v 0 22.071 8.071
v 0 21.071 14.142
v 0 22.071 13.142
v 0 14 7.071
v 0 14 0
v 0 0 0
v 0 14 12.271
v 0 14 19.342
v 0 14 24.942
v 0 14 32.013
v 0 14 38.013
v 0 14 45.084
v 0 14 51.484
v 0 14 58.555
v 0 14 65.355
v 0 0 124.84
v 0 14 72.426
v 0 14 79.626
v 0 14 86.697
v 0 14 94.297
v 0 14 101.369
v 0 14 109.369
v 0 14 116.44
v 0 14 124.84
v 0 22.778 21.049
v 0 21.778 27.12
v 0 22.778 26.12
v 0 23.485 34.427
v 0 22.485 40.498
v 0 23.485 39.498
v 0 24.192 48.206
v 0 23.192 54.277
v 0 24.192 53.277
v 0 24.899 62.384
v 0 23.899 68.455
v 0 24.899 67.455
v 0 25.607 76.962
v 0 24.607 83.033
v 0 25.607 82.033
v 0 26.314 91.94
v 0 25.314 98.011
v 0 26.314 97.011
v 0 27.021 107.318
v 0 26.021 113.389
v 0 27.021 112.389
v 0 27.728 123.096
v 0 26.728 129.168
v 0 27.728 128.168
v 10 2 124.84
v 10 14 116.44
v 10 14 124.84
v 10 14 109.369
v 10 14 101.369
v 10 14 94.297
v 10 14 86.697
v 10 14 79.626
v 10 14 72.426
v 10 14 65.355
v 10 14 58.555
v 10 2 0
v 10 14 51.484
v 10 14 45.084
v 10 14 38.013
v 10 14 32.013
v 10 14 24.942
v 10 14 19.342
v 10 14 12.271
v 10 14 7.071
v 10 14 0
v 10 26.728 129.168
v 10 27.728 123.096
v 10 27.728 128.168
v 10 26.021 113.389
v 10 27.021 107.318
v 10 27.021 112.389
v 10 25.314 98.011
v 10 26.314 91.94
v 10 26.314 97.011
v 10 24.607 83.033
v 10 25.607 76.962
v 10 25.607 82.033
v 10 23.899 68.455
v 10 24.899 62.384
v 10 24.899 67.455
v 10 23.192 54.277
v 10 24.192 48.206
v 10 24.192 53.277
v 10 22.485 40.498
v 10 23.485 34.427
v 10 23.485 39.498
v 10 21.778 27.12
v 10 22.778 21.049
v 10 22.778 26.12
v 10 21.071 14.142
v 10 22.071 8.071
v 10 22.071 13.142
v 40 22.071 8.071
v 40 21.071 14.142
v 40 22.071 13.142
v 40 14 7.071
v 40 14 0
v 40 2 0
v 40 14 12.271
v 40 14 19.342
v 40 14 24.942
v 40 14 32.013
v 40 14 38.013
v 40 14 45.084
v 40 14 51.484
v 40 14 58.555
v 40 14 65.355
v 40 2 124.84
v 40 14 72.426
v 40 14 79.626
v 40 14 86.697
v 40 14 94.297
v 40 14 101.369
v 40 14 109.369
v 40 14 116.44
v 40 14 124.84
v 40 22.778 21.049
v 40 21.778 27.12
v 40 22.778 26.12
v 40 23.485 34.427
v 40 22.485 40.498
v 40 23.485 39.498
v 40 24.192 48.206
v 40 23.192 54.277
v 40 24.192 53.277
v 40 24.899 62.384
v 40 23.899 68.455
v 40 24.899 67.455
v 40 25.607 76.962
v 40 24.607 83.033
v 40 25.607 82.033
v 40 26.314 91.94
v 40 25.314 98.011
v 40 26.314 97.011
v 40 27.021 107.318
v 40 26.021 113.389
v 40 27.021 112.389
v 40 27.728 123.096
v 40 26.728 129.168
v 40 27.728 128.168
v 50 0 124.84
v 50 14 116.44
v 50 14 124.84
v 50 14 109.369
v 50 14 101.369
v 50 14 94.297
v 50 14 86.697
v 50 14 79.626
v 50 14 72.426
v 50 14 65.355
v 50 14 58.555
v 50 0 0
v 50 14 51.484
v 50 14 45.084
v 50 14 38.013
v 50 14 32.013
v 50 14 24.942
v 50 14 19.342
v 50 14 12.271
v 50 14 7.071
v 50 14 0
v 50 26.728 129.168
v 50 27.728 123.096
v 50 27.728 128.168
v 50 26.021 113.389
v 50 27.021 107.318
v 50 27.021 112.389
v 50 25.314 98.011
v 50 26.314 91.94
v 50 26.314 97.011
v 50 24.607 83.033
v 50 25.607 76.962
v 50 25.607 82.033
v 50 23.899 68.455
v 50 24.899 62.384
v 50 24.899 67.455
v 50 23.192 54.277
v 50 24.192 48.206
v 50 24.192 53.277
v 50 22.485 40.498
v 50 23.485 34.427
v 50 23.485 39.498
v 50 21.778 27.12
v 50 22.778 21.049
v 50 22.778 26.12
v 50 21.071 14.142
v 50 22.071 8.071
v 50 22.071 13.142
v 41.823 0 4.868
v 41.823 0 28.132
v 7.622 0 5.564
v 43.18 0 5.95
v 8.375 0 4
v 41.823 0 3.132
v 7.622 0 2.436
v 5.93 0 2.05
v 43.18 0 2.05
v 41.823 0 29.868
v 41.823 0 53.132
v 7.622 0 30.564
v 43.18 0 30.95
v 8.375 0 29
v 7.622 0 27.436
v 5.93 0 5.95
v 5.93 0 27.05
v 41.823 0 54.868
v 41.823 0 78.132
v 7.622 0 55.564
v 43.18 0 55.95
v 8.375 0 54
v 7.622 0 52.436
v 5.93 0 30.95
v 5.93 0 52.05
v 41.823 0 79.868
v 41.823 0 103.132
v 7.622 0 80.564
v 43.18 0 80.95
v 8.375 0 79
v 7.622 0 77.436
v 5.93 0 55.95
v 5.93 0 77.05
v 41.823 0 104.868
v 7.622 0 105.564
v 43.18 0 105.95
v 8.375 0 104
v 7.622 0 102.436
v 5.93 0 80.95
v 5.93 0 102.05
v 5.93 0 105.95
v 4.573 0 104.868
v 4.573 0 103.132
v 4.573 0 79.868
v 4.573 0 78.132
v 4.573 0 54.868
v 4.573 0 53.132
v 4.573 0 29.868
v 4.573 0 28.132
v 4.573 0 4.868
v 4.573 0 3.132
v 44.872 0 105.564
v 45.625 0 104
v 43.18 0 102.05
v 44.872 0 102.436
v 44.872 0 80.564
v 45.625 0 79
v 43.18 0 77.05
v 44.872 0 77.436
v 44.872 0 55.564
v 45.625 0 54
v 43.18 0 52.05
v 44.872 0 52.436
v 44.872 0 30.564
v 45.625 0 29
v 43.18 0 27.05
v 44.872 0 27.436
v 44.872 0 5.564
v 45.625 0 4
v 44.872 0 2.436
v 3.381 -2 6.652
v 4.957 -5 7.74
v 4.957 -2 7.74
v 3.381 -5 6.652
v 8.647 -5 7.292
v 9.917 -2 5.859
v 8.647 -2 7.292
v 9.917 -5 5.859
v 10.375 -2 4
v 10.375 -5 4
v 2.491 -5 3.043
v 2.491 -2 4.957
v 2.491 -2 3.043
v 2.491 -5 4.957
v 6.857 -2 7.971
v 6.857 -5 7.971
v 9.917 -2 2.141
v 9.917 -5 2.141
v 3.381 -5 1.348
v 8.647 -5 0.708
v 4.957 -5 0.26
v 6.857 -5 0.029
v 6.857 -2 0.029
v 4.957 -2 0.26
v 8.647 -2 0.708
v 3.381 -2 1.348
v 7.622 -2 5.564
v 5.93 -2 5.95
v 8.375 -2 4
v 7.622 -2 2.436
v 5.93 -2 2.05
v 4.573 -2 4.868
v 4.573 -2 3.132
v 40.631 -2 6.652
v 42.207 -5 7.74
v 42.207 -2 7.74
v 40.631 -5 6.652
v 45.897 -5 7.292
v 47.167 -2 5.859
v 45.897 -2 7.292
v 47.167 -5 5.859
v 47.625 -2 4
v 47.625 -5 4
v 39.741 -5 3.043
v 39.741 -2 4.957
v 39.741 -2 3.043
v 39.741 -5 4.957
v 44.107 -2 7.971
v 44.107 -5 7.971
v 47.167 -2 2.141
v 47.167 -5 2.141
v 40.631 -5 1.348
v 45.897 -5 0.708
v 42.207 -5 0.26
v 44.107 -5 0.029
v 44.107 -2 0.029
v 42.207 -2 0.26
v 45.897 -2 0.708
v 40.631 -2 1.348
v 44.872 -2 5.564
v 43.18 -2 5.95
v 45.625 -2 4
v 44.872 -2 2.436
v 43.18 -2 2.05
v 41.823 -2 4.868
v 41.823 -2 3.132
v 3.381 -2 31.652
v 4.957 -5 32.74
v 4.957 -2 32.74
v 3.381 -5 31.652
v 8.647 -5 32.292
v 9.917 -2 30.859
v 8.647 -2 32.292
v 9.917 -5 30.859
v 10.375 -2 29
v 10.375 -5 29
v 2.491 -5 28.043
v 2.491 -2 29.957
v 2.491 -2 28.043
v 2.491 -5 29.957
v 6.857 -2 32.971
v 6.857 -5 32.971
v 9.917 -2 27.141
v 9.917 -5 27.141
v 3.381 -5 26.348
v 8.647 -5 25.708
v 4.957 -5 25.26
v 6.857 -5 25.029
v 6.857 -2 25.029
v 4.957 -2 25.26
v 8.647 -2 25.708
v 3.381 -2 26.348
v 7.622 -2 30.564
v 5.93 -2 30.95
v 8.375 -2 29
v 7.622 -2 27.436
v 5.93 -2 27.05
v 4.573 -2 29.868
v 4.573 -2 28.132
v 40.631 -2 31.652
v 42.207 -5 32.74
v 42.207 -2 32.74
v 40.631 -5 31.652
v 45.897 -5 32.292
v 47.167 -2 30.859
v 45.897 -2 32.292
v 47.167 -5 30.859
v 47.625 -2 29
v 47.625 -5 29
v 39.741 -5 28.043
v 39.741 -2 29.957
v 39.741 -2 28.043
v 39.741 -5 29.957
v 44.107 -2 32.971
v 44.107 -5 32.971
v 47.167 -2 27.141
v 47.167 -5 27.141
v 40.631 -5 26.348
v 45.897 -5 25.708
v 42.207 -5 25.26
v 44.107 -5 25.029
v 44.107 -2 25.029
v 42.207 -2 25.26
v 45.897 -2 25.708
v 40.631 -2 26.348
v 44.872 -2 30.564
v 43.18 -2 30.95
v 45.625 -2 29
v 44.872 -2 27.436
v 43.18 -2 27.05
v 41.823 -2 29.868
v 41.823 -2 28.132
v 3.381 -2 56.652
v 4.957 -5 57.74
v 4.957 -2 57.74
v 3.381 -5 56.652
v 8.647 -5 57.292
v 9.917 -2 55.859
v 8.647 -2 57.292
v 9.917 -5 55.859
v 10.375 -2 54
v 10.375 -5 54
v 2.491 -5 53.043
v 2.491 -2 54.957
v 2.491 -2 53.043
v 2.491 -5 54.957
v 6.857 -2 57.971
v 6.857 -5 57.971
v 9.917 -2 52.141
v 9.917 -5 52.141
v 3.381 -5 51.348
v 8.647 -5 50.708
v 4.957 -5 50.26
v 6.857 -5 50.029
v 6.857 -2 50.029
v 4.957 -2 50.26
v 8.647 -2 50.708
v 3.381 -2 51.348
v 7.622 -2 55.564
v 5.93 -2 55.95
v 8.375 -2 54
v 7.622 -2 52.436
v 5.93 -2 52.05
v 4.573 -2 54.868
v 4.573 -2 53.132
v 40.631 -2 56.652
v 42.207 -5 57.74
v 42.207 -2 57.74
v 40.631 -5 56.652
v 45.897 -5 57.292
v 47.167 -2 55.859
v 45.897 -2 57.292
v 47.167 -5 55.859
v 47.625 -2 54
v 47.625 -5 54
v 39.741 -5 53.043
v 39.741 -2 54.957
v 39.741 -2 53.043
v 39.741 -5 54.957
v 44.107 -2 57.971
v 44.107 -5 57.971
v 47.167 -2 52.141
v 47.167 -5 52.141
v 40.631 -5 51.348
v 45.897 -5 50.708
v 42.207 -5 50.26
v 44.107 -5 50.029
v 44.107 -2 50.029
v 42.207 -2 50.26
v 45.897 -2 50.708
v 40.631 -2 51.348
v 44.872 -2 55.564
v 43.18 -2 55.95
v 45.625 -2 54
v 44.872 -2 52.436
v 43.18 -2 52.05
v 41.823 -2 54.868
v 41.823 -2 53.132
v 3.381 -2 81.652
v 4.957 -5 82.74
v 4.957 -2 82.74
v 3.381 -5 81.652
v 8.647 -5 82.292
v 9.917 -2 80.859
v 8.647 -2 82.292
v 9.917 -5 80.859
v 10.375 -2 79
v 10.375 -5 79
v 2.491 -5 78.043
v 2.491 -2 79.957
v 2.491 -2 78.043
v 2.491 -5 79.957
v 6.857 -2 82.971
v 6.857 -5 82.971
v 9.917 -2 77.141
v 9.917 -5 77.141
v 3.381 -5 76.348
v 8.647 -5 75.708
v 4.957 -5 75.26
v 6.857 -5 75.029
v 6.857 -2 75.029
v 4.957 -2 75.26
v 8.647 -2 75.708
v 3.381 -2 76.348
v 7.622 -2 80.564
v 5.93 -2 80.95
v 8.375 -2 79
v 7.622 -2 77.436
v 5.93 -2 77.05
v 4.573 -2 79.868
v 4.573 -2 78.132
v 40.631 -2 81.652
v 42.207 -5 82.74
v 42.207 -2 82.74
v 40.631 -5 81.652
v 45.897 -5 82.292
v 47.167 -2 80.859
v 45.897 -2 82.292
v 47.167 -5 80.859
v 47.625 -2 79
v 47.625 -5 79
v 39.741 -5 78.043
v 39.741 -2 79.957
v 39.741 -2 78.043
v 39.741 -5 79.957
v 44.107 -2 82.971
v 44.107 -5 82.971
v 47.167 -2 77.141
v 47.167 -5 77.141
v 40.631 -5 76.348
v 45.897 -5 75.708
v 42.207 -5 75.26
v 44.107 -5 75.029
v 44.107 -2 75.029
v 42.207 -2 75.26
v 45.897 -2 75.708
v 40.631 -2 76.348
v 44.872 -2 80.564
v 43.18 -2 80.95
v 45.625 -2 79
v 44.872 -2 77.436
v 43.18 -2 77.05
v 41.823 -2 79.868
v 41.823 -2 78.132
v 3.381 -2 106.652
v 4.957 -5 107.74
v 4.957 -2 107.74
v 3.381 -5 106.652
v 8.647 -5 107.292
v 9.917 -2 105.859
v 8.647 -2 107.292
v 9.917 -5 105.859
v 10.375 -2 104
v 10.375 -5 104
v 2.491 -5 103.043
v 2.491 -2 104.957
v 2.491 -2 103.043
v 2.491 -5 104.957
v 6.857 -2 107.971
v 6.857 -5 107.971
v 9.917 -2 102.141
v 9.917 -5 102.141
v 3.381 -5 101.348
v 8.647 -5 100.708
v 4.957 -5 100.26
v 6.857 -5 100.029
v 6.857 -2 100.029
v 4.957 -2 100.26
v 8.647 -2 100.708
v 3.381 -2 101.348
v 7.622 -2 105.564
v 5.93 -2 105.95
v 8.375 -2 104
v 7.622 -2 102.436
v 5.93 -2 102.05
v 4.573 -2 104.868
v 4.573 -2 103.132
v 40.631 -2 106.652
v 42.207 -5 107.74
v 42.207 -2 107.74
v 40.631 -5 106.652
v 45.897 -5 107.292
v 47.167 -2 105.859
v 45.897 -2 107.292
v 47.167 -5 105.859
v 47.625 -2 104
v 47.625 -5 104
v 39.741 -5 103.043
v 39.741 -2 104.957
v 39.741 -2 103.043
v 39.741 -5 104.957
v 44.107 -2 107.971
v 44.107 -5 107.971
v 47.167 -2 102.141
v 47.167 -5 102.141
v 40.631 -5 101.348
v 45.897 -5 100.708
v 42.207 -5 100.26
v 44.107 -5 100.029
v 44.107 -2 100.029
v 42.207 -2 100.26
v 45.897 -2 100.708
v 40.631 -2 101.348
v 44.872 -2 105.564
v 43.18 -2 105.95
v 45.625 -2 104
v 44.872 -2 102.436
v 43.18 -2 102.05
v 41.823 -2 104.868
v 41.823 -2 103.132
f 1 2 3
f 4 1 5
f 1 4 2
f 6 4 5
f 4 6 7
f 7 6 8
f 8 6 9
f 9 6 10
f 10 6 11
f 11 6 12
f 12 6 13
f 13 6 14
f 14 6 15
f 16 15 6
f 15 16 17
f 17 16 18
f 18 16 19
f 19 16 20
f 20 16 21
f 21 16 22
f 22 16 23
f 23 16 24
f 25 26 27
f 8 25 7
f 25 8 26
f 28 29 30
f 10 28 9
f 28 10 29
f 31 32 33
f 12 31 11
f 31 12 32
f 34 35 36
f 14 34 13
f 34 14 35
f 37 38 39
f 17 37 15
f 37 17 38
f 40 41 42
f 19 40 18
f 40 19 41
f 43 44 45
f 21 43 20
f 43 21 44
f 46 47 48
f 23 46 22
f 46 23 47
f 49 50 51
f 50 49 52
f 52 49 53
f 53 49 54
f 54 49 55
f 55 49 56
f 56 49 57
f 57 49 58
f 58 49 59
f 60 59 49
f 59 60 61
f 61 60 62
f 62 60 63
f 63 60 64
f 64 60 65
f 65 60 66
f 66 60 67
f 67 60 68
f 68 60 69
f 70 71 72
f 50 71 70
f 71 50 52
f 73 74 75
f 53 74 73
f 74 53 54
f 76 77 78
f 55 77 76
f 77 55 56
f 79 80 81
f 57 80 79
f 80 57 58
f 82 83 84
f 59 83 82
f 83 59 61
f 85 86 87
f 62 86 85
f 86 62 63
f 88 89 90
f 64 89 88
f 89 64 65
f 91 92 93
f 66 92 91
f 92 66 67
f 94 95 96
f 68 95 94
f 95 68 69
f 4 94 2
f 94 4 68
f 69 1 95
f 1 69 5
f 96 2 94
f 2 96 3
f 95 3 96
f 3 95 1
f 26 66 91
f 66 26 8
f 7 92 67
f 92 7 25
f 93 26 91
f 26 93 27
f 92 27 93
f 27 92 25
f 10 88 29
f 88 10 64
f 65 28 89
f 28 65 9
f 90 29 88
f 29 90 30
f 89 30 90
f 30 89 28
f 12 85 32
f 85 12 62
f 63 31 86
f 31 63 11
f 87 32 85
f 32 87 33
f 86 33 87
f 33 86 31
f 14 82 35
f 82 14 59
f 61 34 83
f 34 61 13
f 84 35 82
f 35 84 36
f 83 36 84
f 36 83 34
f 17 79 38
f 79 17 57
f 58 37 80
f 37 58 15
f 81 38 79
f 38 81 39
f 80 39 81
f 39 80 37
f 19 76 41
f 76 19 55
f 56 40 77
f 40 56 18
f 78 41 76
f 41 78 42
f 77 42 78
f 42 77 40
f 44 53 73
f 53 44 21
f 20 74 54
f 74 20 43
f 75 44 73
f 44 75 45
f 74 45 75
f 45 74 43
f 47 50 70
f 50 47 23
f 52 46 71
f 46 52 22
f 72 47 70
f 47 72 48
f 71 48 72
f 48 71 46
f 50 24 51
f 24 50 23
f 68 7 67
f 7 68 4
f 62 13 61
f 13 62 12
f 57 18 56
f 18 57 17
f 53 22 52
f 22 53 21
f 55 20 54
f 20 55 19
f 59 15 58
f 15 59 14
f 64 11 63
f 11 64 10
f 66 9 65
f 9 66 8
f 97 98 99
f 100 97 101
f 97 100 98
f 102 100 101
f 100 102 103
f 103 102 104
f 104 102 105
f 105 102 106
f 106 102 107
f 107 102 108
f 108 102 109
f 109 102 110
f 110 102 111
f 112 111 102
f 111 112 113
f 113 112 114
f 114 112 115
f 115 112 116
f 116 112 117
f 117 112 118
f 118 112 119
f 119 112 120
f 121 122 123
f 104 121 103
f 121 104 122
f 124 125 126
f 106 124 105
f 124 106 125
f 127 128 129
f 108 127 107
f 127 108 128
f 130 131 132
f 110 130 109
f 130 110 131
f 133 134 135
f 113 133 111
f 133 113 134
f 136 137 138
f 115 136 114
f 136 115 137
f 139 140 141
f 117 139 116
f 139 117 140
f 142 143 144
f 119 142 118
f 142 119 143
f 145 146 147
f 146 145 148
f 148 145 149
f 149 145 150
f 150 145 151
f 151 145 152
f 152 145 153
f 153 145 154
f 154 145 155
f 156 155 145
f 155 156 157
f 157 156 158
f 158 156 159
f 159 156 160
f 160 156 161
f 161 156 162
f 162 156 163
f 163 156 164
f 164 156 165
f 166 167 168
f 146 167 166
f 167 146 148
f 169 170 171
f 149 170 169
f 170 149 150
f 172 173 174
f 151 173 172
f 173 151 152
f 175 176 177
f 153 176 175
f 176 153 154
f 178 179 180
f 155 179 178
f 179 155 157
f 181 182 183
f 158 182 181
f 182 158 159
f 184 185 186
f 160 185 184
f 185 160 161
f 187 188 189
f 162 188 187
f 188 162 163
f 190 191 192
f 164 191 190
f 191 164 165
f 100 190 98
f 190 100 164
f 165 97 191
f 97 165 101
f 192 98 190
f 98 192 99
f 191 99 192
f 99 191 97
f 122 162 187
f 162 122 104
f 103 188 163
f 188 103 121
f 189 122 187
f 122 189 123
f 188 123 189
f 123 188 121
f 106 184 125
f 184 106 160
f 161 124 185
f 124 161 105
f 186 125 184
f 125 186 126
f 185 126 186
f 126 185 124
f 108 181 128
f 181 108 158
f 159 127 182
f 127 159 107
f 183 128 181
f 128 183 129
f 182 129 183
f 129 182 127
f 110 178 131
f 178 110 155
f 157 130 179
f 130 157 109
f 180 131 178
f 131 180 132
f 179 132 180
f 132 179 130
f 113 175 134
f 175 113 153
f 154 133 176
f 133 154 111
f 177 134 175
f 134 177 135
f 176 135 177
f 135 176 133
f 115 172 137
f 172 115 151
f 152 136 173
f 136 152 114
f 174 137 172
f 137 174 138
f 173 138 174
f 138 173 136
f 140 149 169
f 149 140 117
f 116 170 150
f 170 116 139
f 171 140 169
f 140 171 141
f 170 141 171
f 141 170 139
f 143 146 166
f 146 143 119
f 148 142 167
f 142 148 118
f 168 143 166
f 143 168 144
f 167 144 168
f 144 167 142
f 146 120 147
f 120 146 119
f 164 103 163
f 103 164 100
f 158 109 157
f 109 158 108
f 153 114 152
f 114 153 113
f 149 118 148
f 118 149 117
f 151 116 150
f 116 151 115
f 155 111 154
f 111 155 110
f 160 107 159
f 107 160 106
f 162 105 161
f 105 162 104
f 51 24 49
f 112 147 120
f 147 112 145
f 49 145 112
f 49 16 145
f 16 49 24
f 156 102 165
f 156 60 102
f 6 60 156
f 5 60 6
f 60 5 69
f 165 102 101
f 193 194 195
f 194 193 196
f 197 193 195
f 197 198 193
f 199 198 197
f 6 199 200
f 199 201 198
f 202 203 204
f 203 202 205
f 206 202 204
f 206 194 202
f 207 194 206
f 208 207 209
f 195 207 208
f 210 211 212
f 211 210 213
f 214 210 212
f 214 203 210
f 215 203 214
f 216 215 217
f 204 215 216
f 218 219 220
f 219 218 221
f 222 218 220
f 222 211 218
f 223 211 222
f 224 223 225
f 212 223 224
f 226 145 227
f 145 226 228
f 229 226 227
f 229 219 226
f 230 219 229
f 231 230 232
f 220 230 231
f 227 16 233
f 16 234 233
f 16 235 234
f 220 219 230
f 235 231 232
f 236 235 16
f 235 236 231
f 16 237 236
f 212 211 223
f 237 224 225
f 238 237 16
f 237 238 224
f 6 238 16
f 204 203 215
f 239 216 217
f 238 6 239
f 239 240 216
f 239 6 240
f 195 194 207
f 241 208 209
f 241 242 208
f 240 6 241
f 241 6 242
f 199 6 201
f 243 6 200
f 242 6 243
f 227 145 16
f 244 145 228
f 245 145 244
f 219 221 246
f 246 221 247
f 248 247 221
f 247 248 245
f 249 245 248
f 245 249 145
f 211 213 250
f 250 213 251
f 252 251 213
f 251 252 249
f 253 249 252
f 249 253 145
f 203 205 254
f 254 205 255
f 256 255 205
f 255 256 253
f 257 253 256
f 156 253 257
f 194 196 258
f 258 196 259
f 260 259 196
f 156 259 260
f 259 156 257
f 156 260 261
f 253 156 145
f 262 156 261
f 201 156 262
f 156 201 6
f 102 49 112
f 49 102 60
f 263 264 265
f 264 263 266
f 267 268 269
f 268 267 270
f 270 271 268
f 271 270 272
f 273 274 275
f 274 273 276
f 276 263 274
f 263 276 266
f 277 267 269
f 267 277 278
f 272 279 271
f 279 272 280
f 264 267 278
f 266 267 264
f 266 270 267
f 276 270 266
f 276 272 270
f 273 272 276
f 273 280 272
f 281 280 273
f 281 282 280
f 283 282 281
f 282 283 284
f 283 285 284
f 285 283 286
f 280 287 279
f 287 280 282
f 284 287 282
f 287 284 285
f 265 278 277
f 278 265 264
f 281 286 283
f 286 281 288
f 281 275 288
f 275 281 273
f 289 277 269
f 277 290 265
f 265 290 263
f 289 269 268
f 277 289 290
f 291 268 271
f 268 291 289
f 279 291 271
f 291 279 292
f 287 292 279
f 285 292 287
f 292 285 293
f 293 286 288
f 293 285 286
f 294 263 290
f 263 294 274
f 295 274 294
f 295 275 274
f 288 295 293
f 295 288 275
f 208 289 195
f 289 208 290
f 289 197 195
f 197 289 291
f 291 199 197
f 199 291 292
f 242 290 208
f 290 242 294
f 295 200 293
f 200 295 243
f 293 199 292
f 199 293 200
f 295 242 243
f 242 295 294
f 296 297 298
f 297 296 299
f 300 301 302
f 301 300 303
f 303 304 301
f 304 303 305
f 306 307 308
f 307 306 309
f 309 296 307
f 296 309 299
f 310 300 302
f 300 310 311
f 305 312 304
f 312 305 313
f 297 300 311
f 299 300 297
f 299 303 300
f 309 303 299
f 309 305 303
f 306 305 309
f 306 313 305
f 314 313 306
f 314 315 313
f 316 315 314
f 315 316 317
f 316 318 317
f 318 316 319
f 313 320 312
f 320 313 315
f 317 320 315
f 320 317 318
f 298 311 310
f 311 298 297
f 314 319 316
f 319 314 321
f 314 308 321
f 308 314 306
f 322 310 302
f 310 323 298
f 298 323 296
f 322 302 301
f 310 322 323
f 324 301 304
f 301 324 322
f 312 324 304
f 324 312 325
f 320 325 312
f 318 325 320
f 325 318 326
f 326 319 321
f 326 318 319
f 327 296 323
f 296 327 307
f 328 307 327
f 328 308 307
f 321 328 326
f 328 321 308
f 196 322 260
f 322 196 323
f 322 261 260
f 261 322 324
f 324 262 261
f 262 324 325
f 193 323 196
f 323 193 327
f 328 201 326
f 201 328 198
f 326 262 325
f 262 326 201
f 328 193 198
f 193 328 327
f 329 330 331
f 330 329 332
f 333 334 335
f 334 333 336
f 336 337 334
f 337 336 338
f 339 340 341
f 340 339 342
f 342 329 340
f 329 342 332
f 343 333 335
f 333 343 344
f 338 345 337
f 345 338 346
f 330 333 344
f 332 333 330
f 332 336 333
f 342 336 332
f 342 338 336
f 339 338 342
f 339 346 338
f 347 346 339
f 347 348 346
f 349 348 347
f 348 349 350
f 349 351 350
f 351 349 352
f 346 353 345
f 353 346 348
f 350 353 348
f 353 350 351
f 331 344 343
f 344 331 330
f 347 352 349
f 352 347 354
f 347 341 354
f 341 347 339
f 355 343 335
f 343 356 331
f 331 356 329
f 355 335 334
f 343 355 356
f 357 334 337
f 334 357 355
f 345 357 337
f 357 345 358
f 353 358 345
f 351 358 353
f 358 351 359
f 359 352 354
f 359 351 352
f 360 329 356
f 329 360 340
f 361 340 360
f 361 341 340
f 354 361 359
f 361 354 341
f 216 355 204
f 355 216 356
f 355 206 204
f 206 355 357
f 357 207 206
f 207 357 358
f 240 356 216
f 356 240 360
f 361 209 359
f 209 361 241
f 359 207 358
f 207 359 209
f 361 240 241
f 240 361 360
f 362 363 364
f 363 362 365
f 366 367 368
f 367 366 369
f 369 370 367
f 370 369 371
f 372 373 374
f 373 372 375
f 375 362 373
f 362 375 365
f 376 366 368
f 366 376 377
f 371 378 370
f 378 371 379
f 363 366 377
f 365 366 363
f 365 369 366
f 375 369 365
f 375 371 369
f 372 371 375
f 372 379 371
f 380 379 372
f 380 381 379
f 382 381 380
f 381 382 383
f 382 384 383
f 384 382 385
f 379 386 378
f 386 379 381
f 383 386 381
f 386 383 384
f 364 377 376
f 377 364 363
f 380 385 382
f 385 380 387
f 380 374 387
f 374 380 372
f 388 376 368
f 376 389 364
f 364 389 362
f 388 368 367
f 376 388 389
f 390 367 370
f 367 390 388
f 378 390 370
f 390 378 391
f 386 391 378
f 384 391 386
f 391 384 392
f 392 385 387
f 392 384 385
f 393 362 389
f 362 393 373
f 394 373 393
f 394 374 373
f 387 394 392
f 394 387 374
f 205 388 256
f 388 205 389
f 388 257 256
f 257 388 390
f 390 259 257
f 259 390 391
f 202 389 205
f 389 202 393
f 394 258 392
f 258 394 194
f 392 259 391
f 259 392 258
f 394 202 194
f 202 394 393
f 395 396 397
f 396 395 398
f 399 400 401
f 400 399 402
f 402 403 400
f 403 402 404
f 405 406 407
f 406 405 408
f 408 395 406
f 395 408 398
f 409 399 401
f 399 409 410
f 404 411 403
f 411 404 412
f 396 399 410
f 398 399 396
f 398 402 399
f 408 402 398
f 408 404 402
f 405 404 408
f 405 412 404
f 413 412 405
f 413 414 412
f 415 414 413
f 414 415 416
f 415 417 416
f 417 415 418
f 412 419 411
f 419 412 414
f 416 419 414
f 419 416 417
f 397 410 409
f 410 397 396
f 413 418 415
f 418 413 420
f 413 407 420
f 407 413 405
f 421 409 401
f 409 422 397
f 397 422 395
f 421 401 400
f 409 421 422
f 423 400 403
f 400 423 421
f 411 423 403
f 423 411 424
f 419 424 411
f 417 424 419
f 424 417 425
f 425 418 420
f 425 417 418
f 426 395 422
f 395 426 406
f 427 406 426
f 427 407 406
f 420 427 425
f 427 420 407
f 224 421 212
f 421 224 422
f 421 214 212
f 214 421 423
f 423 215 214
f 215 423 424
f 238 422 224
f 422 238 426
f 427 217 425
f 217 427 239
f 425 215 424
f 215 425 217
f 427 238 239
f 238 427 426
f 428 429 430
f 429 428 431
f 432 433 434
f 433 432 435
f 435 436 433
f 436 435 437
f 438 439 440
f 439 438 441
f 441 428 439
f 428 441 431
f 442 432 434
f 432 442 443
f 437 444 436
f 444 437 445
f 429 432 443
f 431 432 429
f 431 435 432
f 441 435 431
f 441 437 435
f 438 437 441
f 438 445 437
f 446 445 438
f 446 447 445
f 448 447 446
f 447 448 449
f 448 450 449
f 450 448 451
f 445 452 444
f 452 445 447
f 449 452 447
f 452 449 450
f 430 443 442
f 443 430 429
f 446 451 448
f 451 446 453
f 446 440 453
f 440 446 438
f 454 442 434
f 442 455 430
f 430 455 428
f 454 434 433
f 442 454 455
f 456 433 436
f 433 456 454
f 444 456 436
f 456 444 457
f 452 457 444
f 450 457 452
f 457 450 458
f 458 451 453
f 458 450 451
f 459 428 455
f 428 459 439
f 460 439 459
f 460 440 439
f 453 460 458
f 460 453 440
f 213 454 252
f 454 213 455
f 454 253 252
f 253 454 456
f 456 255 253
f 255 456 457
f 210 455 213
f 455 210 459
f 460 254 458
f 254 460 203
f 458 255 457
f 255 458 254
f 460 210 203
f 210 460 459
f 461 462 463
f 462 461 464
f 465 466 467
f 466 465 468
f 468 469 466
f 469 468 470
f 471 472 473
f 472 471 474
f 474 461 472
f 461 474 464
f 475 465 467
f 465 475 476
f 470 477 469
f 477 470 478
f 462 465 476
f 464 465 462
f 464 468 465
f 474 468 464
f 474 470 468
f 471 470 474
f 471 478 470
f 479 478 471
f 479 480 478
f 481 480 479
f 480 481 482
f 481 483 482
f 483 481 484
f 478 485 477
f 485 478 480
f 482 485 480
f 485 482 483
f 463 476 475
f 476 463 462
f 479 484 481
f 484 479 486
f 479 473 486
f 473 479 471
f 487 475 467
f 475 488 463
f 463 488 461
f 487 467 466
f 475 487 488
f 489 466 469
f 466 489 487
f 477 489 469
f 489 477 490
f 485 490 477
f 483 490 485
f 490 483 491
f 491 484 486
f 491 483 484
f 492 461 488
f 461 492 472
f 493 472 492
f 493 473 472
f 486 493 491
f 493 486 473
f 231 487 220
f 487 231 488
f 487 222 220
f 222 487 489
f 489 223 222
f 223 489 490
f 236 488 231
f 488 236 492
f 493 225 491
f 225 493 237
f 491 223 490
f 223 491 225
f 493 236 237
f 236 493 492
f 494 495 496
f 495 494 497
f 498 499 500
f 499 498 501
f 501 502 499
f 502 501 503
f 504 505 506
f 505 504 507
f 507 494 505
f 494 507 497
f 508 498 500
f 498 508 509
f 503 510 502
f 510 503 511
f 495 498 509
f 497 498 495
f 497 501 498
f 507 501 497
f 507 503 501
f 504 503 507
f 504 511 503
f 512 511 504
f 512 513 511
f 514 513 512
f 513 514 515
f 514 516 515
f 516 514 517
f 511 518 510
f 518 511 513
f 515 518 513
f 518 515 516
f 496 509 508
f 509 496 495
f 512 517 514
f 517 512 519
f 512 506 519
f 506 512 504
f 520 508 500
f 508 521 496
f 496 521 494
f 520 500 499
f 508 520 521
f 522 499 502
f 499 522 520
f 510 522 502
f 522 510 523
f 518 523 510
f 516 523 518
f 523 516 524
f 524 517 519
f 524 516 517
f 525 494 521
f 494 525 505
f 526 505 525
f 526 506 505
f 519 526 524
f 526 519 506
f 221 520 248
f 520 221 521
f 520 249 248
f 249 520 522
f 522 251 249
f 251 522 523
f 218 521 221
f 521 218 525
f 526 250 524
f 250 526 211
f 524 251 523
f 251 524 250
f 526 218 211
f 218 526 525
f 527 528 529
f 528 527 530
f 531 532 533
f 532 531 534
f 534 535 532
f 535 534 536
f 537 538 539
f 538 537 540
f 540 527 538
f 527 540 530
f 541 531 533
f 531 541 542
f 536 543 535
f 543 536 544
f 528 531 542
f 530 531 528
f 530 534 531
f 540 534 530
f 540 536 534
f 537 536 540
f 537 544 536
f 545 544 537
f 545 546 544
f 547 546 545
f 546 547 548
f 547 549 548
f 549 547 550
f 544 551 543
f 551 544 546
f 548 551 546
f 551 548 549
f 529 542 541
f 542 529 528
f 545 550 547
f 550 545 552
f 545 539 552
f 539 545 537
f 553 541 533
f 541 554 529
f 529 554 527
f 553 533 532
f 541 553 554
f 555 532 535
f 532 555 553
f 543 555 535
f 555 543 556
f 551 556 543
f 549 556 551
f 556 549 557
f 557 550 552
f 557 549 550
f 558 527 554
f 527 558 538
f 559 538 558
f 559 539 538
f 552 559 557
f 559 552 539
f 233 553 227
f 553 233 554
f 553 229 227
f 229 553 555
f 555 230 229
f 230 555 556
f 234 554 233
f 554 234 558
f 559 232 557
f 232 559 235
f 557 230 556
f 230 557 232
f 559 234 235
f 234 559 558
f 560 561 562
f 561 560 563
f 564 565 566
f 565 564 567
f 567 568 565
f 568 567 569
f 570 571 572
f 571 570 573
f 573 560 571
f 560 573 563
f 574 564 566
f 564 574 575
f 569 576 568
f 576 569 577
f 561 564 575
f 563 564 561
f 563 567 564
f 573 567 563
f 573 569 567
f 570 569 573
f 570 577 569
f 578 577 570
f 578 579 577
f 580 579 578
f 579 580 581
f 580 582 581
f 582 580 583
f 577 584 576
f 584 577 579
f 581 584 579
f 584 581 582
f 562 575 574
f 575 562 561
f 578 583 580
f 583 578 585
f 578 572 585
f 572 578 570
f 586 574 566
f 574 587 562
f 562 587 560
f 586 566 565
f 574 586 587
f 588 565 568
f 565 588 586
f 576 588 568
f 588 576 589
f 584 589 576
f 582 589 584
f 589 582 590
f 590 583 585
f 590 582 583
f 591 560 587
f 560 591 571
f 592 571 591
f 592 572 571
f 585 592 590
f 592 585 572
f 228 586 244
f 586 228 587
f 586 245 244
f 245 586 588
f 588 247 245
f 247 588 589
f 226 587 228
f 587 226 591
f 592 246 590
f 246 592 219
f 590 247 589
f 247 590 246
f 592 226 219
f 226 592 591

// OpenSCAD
// file: modules/module_pegs.scad
module pegs_lux(width,rows)
{
    dia_knob    = 8;
    len_knob    = 3;
    dia_pin     = 4;
    wall        = 2;
    dist        = 30.10;
    height      = 25;
    
    pegs(dist,height,wall,dia_knob,len_knob,dia_pin,rows);
}

module pegs_hornbach(width,rows)
{
    dia_knob    = 8;
    len_knob    = 3;
    dia_pin     = 4;
    wall        = 2;
    dist        = 45;
    height      = 25;
    
    pegs(dist,height,wall,dia_knob,len_knob,dia_pin);
}

module pegs(dist,height,wall,dia_knob,len_knob,dia_pin,rows)
{
    for(off_y=[0:height:(rows-1)*height])
    {
        translate([dia_knob/2,0,off_y+dia_knob/2])
        {
            for(i=[0:dist:width-dia_knob])
            {
                translate([i+((width-dia_knob)%dist)/2,0,0])
                {
                    peg(wall,dia_knob,len_knob,dia_pin);
                }
            }
        }
    }
}

module peg(wall,dia_knob,len_knob,dia_pin)
{
    rotate([90,0,0])
    {
        translate([0,0,wall])
        {
            cylinder(h=len_knob,d=dia_knob);
        }
        translate([0,0,0])
        {
            cylinder(h=wall,d=dia_pin);
        }
    }
}
// file: modules/module_wrench.scad
module wrench(count,width,angle)
{
    height=15;
    height_min=height;
    height_growth=1;
    gap=5;
    gap_growth=0.2;
    holder_width=10;
    holder_thickness=5;
    height_plate=14;
    
    gap_min=gap/cos(angle);
    
    translate([0,height_plate,0])
    {
        holders();
        translate([width-holder_width,0,0])
        {
            holders();
        }
    }
    cube([holder_width,height_plate,count*(gap_min+(count*gap_growth)+holder_thickness)]);
    translate([width-holder_width,0,0])
    {
        cube([holder_width,height_plate,count*(gap_min+(count*gap_growth)+holder_thickness)]);
    }
    cube([width,2,count*(gap_min+(count*gap_growth)+holder_thickness)]);
    
    module holders()
    {
        difference()
        {
            for(num=[0:1:count-1])
            {
                translate([0,0,num*(gap_min+(num*gap_growth)+holder_thickness)])
                {
                    difference()
                    {
                        rotate([angle,0,0])
                        {
                            cube([holder_width,height_min+(height_growth*num),holder_thickness]);
                        } 
                        translate([0,
                                   cos(angle)*(height_min+(height_growth*num))-sin(angle)*holder_thickness+1,
                                   sin(angle)*(height_min+(height_growth*num))-tan(angle)*(sin(angle)*holder_thickness)])
                        {
                            #cube([holder_width,
                                   sin(angle)*holder_thickness,
                                   holder_thickness/cos(angle)]);
                        }
                    }
                }
            }
            cutoff=10;
            translate([0,-cutoff,0])
            {
                #cube([holder_width,cutoff,count*(gap_min+(count*gap_growth)+holder_thickness)]);
            }
        }
    }
}
// main file
include <modules/module_wrench.scad>;
include <modules/module_pegs.scad>;

count=9;
width=50;
angle=45;
rows=5;


wrench(count,width,angle);
pegs_lux(width,rows);
